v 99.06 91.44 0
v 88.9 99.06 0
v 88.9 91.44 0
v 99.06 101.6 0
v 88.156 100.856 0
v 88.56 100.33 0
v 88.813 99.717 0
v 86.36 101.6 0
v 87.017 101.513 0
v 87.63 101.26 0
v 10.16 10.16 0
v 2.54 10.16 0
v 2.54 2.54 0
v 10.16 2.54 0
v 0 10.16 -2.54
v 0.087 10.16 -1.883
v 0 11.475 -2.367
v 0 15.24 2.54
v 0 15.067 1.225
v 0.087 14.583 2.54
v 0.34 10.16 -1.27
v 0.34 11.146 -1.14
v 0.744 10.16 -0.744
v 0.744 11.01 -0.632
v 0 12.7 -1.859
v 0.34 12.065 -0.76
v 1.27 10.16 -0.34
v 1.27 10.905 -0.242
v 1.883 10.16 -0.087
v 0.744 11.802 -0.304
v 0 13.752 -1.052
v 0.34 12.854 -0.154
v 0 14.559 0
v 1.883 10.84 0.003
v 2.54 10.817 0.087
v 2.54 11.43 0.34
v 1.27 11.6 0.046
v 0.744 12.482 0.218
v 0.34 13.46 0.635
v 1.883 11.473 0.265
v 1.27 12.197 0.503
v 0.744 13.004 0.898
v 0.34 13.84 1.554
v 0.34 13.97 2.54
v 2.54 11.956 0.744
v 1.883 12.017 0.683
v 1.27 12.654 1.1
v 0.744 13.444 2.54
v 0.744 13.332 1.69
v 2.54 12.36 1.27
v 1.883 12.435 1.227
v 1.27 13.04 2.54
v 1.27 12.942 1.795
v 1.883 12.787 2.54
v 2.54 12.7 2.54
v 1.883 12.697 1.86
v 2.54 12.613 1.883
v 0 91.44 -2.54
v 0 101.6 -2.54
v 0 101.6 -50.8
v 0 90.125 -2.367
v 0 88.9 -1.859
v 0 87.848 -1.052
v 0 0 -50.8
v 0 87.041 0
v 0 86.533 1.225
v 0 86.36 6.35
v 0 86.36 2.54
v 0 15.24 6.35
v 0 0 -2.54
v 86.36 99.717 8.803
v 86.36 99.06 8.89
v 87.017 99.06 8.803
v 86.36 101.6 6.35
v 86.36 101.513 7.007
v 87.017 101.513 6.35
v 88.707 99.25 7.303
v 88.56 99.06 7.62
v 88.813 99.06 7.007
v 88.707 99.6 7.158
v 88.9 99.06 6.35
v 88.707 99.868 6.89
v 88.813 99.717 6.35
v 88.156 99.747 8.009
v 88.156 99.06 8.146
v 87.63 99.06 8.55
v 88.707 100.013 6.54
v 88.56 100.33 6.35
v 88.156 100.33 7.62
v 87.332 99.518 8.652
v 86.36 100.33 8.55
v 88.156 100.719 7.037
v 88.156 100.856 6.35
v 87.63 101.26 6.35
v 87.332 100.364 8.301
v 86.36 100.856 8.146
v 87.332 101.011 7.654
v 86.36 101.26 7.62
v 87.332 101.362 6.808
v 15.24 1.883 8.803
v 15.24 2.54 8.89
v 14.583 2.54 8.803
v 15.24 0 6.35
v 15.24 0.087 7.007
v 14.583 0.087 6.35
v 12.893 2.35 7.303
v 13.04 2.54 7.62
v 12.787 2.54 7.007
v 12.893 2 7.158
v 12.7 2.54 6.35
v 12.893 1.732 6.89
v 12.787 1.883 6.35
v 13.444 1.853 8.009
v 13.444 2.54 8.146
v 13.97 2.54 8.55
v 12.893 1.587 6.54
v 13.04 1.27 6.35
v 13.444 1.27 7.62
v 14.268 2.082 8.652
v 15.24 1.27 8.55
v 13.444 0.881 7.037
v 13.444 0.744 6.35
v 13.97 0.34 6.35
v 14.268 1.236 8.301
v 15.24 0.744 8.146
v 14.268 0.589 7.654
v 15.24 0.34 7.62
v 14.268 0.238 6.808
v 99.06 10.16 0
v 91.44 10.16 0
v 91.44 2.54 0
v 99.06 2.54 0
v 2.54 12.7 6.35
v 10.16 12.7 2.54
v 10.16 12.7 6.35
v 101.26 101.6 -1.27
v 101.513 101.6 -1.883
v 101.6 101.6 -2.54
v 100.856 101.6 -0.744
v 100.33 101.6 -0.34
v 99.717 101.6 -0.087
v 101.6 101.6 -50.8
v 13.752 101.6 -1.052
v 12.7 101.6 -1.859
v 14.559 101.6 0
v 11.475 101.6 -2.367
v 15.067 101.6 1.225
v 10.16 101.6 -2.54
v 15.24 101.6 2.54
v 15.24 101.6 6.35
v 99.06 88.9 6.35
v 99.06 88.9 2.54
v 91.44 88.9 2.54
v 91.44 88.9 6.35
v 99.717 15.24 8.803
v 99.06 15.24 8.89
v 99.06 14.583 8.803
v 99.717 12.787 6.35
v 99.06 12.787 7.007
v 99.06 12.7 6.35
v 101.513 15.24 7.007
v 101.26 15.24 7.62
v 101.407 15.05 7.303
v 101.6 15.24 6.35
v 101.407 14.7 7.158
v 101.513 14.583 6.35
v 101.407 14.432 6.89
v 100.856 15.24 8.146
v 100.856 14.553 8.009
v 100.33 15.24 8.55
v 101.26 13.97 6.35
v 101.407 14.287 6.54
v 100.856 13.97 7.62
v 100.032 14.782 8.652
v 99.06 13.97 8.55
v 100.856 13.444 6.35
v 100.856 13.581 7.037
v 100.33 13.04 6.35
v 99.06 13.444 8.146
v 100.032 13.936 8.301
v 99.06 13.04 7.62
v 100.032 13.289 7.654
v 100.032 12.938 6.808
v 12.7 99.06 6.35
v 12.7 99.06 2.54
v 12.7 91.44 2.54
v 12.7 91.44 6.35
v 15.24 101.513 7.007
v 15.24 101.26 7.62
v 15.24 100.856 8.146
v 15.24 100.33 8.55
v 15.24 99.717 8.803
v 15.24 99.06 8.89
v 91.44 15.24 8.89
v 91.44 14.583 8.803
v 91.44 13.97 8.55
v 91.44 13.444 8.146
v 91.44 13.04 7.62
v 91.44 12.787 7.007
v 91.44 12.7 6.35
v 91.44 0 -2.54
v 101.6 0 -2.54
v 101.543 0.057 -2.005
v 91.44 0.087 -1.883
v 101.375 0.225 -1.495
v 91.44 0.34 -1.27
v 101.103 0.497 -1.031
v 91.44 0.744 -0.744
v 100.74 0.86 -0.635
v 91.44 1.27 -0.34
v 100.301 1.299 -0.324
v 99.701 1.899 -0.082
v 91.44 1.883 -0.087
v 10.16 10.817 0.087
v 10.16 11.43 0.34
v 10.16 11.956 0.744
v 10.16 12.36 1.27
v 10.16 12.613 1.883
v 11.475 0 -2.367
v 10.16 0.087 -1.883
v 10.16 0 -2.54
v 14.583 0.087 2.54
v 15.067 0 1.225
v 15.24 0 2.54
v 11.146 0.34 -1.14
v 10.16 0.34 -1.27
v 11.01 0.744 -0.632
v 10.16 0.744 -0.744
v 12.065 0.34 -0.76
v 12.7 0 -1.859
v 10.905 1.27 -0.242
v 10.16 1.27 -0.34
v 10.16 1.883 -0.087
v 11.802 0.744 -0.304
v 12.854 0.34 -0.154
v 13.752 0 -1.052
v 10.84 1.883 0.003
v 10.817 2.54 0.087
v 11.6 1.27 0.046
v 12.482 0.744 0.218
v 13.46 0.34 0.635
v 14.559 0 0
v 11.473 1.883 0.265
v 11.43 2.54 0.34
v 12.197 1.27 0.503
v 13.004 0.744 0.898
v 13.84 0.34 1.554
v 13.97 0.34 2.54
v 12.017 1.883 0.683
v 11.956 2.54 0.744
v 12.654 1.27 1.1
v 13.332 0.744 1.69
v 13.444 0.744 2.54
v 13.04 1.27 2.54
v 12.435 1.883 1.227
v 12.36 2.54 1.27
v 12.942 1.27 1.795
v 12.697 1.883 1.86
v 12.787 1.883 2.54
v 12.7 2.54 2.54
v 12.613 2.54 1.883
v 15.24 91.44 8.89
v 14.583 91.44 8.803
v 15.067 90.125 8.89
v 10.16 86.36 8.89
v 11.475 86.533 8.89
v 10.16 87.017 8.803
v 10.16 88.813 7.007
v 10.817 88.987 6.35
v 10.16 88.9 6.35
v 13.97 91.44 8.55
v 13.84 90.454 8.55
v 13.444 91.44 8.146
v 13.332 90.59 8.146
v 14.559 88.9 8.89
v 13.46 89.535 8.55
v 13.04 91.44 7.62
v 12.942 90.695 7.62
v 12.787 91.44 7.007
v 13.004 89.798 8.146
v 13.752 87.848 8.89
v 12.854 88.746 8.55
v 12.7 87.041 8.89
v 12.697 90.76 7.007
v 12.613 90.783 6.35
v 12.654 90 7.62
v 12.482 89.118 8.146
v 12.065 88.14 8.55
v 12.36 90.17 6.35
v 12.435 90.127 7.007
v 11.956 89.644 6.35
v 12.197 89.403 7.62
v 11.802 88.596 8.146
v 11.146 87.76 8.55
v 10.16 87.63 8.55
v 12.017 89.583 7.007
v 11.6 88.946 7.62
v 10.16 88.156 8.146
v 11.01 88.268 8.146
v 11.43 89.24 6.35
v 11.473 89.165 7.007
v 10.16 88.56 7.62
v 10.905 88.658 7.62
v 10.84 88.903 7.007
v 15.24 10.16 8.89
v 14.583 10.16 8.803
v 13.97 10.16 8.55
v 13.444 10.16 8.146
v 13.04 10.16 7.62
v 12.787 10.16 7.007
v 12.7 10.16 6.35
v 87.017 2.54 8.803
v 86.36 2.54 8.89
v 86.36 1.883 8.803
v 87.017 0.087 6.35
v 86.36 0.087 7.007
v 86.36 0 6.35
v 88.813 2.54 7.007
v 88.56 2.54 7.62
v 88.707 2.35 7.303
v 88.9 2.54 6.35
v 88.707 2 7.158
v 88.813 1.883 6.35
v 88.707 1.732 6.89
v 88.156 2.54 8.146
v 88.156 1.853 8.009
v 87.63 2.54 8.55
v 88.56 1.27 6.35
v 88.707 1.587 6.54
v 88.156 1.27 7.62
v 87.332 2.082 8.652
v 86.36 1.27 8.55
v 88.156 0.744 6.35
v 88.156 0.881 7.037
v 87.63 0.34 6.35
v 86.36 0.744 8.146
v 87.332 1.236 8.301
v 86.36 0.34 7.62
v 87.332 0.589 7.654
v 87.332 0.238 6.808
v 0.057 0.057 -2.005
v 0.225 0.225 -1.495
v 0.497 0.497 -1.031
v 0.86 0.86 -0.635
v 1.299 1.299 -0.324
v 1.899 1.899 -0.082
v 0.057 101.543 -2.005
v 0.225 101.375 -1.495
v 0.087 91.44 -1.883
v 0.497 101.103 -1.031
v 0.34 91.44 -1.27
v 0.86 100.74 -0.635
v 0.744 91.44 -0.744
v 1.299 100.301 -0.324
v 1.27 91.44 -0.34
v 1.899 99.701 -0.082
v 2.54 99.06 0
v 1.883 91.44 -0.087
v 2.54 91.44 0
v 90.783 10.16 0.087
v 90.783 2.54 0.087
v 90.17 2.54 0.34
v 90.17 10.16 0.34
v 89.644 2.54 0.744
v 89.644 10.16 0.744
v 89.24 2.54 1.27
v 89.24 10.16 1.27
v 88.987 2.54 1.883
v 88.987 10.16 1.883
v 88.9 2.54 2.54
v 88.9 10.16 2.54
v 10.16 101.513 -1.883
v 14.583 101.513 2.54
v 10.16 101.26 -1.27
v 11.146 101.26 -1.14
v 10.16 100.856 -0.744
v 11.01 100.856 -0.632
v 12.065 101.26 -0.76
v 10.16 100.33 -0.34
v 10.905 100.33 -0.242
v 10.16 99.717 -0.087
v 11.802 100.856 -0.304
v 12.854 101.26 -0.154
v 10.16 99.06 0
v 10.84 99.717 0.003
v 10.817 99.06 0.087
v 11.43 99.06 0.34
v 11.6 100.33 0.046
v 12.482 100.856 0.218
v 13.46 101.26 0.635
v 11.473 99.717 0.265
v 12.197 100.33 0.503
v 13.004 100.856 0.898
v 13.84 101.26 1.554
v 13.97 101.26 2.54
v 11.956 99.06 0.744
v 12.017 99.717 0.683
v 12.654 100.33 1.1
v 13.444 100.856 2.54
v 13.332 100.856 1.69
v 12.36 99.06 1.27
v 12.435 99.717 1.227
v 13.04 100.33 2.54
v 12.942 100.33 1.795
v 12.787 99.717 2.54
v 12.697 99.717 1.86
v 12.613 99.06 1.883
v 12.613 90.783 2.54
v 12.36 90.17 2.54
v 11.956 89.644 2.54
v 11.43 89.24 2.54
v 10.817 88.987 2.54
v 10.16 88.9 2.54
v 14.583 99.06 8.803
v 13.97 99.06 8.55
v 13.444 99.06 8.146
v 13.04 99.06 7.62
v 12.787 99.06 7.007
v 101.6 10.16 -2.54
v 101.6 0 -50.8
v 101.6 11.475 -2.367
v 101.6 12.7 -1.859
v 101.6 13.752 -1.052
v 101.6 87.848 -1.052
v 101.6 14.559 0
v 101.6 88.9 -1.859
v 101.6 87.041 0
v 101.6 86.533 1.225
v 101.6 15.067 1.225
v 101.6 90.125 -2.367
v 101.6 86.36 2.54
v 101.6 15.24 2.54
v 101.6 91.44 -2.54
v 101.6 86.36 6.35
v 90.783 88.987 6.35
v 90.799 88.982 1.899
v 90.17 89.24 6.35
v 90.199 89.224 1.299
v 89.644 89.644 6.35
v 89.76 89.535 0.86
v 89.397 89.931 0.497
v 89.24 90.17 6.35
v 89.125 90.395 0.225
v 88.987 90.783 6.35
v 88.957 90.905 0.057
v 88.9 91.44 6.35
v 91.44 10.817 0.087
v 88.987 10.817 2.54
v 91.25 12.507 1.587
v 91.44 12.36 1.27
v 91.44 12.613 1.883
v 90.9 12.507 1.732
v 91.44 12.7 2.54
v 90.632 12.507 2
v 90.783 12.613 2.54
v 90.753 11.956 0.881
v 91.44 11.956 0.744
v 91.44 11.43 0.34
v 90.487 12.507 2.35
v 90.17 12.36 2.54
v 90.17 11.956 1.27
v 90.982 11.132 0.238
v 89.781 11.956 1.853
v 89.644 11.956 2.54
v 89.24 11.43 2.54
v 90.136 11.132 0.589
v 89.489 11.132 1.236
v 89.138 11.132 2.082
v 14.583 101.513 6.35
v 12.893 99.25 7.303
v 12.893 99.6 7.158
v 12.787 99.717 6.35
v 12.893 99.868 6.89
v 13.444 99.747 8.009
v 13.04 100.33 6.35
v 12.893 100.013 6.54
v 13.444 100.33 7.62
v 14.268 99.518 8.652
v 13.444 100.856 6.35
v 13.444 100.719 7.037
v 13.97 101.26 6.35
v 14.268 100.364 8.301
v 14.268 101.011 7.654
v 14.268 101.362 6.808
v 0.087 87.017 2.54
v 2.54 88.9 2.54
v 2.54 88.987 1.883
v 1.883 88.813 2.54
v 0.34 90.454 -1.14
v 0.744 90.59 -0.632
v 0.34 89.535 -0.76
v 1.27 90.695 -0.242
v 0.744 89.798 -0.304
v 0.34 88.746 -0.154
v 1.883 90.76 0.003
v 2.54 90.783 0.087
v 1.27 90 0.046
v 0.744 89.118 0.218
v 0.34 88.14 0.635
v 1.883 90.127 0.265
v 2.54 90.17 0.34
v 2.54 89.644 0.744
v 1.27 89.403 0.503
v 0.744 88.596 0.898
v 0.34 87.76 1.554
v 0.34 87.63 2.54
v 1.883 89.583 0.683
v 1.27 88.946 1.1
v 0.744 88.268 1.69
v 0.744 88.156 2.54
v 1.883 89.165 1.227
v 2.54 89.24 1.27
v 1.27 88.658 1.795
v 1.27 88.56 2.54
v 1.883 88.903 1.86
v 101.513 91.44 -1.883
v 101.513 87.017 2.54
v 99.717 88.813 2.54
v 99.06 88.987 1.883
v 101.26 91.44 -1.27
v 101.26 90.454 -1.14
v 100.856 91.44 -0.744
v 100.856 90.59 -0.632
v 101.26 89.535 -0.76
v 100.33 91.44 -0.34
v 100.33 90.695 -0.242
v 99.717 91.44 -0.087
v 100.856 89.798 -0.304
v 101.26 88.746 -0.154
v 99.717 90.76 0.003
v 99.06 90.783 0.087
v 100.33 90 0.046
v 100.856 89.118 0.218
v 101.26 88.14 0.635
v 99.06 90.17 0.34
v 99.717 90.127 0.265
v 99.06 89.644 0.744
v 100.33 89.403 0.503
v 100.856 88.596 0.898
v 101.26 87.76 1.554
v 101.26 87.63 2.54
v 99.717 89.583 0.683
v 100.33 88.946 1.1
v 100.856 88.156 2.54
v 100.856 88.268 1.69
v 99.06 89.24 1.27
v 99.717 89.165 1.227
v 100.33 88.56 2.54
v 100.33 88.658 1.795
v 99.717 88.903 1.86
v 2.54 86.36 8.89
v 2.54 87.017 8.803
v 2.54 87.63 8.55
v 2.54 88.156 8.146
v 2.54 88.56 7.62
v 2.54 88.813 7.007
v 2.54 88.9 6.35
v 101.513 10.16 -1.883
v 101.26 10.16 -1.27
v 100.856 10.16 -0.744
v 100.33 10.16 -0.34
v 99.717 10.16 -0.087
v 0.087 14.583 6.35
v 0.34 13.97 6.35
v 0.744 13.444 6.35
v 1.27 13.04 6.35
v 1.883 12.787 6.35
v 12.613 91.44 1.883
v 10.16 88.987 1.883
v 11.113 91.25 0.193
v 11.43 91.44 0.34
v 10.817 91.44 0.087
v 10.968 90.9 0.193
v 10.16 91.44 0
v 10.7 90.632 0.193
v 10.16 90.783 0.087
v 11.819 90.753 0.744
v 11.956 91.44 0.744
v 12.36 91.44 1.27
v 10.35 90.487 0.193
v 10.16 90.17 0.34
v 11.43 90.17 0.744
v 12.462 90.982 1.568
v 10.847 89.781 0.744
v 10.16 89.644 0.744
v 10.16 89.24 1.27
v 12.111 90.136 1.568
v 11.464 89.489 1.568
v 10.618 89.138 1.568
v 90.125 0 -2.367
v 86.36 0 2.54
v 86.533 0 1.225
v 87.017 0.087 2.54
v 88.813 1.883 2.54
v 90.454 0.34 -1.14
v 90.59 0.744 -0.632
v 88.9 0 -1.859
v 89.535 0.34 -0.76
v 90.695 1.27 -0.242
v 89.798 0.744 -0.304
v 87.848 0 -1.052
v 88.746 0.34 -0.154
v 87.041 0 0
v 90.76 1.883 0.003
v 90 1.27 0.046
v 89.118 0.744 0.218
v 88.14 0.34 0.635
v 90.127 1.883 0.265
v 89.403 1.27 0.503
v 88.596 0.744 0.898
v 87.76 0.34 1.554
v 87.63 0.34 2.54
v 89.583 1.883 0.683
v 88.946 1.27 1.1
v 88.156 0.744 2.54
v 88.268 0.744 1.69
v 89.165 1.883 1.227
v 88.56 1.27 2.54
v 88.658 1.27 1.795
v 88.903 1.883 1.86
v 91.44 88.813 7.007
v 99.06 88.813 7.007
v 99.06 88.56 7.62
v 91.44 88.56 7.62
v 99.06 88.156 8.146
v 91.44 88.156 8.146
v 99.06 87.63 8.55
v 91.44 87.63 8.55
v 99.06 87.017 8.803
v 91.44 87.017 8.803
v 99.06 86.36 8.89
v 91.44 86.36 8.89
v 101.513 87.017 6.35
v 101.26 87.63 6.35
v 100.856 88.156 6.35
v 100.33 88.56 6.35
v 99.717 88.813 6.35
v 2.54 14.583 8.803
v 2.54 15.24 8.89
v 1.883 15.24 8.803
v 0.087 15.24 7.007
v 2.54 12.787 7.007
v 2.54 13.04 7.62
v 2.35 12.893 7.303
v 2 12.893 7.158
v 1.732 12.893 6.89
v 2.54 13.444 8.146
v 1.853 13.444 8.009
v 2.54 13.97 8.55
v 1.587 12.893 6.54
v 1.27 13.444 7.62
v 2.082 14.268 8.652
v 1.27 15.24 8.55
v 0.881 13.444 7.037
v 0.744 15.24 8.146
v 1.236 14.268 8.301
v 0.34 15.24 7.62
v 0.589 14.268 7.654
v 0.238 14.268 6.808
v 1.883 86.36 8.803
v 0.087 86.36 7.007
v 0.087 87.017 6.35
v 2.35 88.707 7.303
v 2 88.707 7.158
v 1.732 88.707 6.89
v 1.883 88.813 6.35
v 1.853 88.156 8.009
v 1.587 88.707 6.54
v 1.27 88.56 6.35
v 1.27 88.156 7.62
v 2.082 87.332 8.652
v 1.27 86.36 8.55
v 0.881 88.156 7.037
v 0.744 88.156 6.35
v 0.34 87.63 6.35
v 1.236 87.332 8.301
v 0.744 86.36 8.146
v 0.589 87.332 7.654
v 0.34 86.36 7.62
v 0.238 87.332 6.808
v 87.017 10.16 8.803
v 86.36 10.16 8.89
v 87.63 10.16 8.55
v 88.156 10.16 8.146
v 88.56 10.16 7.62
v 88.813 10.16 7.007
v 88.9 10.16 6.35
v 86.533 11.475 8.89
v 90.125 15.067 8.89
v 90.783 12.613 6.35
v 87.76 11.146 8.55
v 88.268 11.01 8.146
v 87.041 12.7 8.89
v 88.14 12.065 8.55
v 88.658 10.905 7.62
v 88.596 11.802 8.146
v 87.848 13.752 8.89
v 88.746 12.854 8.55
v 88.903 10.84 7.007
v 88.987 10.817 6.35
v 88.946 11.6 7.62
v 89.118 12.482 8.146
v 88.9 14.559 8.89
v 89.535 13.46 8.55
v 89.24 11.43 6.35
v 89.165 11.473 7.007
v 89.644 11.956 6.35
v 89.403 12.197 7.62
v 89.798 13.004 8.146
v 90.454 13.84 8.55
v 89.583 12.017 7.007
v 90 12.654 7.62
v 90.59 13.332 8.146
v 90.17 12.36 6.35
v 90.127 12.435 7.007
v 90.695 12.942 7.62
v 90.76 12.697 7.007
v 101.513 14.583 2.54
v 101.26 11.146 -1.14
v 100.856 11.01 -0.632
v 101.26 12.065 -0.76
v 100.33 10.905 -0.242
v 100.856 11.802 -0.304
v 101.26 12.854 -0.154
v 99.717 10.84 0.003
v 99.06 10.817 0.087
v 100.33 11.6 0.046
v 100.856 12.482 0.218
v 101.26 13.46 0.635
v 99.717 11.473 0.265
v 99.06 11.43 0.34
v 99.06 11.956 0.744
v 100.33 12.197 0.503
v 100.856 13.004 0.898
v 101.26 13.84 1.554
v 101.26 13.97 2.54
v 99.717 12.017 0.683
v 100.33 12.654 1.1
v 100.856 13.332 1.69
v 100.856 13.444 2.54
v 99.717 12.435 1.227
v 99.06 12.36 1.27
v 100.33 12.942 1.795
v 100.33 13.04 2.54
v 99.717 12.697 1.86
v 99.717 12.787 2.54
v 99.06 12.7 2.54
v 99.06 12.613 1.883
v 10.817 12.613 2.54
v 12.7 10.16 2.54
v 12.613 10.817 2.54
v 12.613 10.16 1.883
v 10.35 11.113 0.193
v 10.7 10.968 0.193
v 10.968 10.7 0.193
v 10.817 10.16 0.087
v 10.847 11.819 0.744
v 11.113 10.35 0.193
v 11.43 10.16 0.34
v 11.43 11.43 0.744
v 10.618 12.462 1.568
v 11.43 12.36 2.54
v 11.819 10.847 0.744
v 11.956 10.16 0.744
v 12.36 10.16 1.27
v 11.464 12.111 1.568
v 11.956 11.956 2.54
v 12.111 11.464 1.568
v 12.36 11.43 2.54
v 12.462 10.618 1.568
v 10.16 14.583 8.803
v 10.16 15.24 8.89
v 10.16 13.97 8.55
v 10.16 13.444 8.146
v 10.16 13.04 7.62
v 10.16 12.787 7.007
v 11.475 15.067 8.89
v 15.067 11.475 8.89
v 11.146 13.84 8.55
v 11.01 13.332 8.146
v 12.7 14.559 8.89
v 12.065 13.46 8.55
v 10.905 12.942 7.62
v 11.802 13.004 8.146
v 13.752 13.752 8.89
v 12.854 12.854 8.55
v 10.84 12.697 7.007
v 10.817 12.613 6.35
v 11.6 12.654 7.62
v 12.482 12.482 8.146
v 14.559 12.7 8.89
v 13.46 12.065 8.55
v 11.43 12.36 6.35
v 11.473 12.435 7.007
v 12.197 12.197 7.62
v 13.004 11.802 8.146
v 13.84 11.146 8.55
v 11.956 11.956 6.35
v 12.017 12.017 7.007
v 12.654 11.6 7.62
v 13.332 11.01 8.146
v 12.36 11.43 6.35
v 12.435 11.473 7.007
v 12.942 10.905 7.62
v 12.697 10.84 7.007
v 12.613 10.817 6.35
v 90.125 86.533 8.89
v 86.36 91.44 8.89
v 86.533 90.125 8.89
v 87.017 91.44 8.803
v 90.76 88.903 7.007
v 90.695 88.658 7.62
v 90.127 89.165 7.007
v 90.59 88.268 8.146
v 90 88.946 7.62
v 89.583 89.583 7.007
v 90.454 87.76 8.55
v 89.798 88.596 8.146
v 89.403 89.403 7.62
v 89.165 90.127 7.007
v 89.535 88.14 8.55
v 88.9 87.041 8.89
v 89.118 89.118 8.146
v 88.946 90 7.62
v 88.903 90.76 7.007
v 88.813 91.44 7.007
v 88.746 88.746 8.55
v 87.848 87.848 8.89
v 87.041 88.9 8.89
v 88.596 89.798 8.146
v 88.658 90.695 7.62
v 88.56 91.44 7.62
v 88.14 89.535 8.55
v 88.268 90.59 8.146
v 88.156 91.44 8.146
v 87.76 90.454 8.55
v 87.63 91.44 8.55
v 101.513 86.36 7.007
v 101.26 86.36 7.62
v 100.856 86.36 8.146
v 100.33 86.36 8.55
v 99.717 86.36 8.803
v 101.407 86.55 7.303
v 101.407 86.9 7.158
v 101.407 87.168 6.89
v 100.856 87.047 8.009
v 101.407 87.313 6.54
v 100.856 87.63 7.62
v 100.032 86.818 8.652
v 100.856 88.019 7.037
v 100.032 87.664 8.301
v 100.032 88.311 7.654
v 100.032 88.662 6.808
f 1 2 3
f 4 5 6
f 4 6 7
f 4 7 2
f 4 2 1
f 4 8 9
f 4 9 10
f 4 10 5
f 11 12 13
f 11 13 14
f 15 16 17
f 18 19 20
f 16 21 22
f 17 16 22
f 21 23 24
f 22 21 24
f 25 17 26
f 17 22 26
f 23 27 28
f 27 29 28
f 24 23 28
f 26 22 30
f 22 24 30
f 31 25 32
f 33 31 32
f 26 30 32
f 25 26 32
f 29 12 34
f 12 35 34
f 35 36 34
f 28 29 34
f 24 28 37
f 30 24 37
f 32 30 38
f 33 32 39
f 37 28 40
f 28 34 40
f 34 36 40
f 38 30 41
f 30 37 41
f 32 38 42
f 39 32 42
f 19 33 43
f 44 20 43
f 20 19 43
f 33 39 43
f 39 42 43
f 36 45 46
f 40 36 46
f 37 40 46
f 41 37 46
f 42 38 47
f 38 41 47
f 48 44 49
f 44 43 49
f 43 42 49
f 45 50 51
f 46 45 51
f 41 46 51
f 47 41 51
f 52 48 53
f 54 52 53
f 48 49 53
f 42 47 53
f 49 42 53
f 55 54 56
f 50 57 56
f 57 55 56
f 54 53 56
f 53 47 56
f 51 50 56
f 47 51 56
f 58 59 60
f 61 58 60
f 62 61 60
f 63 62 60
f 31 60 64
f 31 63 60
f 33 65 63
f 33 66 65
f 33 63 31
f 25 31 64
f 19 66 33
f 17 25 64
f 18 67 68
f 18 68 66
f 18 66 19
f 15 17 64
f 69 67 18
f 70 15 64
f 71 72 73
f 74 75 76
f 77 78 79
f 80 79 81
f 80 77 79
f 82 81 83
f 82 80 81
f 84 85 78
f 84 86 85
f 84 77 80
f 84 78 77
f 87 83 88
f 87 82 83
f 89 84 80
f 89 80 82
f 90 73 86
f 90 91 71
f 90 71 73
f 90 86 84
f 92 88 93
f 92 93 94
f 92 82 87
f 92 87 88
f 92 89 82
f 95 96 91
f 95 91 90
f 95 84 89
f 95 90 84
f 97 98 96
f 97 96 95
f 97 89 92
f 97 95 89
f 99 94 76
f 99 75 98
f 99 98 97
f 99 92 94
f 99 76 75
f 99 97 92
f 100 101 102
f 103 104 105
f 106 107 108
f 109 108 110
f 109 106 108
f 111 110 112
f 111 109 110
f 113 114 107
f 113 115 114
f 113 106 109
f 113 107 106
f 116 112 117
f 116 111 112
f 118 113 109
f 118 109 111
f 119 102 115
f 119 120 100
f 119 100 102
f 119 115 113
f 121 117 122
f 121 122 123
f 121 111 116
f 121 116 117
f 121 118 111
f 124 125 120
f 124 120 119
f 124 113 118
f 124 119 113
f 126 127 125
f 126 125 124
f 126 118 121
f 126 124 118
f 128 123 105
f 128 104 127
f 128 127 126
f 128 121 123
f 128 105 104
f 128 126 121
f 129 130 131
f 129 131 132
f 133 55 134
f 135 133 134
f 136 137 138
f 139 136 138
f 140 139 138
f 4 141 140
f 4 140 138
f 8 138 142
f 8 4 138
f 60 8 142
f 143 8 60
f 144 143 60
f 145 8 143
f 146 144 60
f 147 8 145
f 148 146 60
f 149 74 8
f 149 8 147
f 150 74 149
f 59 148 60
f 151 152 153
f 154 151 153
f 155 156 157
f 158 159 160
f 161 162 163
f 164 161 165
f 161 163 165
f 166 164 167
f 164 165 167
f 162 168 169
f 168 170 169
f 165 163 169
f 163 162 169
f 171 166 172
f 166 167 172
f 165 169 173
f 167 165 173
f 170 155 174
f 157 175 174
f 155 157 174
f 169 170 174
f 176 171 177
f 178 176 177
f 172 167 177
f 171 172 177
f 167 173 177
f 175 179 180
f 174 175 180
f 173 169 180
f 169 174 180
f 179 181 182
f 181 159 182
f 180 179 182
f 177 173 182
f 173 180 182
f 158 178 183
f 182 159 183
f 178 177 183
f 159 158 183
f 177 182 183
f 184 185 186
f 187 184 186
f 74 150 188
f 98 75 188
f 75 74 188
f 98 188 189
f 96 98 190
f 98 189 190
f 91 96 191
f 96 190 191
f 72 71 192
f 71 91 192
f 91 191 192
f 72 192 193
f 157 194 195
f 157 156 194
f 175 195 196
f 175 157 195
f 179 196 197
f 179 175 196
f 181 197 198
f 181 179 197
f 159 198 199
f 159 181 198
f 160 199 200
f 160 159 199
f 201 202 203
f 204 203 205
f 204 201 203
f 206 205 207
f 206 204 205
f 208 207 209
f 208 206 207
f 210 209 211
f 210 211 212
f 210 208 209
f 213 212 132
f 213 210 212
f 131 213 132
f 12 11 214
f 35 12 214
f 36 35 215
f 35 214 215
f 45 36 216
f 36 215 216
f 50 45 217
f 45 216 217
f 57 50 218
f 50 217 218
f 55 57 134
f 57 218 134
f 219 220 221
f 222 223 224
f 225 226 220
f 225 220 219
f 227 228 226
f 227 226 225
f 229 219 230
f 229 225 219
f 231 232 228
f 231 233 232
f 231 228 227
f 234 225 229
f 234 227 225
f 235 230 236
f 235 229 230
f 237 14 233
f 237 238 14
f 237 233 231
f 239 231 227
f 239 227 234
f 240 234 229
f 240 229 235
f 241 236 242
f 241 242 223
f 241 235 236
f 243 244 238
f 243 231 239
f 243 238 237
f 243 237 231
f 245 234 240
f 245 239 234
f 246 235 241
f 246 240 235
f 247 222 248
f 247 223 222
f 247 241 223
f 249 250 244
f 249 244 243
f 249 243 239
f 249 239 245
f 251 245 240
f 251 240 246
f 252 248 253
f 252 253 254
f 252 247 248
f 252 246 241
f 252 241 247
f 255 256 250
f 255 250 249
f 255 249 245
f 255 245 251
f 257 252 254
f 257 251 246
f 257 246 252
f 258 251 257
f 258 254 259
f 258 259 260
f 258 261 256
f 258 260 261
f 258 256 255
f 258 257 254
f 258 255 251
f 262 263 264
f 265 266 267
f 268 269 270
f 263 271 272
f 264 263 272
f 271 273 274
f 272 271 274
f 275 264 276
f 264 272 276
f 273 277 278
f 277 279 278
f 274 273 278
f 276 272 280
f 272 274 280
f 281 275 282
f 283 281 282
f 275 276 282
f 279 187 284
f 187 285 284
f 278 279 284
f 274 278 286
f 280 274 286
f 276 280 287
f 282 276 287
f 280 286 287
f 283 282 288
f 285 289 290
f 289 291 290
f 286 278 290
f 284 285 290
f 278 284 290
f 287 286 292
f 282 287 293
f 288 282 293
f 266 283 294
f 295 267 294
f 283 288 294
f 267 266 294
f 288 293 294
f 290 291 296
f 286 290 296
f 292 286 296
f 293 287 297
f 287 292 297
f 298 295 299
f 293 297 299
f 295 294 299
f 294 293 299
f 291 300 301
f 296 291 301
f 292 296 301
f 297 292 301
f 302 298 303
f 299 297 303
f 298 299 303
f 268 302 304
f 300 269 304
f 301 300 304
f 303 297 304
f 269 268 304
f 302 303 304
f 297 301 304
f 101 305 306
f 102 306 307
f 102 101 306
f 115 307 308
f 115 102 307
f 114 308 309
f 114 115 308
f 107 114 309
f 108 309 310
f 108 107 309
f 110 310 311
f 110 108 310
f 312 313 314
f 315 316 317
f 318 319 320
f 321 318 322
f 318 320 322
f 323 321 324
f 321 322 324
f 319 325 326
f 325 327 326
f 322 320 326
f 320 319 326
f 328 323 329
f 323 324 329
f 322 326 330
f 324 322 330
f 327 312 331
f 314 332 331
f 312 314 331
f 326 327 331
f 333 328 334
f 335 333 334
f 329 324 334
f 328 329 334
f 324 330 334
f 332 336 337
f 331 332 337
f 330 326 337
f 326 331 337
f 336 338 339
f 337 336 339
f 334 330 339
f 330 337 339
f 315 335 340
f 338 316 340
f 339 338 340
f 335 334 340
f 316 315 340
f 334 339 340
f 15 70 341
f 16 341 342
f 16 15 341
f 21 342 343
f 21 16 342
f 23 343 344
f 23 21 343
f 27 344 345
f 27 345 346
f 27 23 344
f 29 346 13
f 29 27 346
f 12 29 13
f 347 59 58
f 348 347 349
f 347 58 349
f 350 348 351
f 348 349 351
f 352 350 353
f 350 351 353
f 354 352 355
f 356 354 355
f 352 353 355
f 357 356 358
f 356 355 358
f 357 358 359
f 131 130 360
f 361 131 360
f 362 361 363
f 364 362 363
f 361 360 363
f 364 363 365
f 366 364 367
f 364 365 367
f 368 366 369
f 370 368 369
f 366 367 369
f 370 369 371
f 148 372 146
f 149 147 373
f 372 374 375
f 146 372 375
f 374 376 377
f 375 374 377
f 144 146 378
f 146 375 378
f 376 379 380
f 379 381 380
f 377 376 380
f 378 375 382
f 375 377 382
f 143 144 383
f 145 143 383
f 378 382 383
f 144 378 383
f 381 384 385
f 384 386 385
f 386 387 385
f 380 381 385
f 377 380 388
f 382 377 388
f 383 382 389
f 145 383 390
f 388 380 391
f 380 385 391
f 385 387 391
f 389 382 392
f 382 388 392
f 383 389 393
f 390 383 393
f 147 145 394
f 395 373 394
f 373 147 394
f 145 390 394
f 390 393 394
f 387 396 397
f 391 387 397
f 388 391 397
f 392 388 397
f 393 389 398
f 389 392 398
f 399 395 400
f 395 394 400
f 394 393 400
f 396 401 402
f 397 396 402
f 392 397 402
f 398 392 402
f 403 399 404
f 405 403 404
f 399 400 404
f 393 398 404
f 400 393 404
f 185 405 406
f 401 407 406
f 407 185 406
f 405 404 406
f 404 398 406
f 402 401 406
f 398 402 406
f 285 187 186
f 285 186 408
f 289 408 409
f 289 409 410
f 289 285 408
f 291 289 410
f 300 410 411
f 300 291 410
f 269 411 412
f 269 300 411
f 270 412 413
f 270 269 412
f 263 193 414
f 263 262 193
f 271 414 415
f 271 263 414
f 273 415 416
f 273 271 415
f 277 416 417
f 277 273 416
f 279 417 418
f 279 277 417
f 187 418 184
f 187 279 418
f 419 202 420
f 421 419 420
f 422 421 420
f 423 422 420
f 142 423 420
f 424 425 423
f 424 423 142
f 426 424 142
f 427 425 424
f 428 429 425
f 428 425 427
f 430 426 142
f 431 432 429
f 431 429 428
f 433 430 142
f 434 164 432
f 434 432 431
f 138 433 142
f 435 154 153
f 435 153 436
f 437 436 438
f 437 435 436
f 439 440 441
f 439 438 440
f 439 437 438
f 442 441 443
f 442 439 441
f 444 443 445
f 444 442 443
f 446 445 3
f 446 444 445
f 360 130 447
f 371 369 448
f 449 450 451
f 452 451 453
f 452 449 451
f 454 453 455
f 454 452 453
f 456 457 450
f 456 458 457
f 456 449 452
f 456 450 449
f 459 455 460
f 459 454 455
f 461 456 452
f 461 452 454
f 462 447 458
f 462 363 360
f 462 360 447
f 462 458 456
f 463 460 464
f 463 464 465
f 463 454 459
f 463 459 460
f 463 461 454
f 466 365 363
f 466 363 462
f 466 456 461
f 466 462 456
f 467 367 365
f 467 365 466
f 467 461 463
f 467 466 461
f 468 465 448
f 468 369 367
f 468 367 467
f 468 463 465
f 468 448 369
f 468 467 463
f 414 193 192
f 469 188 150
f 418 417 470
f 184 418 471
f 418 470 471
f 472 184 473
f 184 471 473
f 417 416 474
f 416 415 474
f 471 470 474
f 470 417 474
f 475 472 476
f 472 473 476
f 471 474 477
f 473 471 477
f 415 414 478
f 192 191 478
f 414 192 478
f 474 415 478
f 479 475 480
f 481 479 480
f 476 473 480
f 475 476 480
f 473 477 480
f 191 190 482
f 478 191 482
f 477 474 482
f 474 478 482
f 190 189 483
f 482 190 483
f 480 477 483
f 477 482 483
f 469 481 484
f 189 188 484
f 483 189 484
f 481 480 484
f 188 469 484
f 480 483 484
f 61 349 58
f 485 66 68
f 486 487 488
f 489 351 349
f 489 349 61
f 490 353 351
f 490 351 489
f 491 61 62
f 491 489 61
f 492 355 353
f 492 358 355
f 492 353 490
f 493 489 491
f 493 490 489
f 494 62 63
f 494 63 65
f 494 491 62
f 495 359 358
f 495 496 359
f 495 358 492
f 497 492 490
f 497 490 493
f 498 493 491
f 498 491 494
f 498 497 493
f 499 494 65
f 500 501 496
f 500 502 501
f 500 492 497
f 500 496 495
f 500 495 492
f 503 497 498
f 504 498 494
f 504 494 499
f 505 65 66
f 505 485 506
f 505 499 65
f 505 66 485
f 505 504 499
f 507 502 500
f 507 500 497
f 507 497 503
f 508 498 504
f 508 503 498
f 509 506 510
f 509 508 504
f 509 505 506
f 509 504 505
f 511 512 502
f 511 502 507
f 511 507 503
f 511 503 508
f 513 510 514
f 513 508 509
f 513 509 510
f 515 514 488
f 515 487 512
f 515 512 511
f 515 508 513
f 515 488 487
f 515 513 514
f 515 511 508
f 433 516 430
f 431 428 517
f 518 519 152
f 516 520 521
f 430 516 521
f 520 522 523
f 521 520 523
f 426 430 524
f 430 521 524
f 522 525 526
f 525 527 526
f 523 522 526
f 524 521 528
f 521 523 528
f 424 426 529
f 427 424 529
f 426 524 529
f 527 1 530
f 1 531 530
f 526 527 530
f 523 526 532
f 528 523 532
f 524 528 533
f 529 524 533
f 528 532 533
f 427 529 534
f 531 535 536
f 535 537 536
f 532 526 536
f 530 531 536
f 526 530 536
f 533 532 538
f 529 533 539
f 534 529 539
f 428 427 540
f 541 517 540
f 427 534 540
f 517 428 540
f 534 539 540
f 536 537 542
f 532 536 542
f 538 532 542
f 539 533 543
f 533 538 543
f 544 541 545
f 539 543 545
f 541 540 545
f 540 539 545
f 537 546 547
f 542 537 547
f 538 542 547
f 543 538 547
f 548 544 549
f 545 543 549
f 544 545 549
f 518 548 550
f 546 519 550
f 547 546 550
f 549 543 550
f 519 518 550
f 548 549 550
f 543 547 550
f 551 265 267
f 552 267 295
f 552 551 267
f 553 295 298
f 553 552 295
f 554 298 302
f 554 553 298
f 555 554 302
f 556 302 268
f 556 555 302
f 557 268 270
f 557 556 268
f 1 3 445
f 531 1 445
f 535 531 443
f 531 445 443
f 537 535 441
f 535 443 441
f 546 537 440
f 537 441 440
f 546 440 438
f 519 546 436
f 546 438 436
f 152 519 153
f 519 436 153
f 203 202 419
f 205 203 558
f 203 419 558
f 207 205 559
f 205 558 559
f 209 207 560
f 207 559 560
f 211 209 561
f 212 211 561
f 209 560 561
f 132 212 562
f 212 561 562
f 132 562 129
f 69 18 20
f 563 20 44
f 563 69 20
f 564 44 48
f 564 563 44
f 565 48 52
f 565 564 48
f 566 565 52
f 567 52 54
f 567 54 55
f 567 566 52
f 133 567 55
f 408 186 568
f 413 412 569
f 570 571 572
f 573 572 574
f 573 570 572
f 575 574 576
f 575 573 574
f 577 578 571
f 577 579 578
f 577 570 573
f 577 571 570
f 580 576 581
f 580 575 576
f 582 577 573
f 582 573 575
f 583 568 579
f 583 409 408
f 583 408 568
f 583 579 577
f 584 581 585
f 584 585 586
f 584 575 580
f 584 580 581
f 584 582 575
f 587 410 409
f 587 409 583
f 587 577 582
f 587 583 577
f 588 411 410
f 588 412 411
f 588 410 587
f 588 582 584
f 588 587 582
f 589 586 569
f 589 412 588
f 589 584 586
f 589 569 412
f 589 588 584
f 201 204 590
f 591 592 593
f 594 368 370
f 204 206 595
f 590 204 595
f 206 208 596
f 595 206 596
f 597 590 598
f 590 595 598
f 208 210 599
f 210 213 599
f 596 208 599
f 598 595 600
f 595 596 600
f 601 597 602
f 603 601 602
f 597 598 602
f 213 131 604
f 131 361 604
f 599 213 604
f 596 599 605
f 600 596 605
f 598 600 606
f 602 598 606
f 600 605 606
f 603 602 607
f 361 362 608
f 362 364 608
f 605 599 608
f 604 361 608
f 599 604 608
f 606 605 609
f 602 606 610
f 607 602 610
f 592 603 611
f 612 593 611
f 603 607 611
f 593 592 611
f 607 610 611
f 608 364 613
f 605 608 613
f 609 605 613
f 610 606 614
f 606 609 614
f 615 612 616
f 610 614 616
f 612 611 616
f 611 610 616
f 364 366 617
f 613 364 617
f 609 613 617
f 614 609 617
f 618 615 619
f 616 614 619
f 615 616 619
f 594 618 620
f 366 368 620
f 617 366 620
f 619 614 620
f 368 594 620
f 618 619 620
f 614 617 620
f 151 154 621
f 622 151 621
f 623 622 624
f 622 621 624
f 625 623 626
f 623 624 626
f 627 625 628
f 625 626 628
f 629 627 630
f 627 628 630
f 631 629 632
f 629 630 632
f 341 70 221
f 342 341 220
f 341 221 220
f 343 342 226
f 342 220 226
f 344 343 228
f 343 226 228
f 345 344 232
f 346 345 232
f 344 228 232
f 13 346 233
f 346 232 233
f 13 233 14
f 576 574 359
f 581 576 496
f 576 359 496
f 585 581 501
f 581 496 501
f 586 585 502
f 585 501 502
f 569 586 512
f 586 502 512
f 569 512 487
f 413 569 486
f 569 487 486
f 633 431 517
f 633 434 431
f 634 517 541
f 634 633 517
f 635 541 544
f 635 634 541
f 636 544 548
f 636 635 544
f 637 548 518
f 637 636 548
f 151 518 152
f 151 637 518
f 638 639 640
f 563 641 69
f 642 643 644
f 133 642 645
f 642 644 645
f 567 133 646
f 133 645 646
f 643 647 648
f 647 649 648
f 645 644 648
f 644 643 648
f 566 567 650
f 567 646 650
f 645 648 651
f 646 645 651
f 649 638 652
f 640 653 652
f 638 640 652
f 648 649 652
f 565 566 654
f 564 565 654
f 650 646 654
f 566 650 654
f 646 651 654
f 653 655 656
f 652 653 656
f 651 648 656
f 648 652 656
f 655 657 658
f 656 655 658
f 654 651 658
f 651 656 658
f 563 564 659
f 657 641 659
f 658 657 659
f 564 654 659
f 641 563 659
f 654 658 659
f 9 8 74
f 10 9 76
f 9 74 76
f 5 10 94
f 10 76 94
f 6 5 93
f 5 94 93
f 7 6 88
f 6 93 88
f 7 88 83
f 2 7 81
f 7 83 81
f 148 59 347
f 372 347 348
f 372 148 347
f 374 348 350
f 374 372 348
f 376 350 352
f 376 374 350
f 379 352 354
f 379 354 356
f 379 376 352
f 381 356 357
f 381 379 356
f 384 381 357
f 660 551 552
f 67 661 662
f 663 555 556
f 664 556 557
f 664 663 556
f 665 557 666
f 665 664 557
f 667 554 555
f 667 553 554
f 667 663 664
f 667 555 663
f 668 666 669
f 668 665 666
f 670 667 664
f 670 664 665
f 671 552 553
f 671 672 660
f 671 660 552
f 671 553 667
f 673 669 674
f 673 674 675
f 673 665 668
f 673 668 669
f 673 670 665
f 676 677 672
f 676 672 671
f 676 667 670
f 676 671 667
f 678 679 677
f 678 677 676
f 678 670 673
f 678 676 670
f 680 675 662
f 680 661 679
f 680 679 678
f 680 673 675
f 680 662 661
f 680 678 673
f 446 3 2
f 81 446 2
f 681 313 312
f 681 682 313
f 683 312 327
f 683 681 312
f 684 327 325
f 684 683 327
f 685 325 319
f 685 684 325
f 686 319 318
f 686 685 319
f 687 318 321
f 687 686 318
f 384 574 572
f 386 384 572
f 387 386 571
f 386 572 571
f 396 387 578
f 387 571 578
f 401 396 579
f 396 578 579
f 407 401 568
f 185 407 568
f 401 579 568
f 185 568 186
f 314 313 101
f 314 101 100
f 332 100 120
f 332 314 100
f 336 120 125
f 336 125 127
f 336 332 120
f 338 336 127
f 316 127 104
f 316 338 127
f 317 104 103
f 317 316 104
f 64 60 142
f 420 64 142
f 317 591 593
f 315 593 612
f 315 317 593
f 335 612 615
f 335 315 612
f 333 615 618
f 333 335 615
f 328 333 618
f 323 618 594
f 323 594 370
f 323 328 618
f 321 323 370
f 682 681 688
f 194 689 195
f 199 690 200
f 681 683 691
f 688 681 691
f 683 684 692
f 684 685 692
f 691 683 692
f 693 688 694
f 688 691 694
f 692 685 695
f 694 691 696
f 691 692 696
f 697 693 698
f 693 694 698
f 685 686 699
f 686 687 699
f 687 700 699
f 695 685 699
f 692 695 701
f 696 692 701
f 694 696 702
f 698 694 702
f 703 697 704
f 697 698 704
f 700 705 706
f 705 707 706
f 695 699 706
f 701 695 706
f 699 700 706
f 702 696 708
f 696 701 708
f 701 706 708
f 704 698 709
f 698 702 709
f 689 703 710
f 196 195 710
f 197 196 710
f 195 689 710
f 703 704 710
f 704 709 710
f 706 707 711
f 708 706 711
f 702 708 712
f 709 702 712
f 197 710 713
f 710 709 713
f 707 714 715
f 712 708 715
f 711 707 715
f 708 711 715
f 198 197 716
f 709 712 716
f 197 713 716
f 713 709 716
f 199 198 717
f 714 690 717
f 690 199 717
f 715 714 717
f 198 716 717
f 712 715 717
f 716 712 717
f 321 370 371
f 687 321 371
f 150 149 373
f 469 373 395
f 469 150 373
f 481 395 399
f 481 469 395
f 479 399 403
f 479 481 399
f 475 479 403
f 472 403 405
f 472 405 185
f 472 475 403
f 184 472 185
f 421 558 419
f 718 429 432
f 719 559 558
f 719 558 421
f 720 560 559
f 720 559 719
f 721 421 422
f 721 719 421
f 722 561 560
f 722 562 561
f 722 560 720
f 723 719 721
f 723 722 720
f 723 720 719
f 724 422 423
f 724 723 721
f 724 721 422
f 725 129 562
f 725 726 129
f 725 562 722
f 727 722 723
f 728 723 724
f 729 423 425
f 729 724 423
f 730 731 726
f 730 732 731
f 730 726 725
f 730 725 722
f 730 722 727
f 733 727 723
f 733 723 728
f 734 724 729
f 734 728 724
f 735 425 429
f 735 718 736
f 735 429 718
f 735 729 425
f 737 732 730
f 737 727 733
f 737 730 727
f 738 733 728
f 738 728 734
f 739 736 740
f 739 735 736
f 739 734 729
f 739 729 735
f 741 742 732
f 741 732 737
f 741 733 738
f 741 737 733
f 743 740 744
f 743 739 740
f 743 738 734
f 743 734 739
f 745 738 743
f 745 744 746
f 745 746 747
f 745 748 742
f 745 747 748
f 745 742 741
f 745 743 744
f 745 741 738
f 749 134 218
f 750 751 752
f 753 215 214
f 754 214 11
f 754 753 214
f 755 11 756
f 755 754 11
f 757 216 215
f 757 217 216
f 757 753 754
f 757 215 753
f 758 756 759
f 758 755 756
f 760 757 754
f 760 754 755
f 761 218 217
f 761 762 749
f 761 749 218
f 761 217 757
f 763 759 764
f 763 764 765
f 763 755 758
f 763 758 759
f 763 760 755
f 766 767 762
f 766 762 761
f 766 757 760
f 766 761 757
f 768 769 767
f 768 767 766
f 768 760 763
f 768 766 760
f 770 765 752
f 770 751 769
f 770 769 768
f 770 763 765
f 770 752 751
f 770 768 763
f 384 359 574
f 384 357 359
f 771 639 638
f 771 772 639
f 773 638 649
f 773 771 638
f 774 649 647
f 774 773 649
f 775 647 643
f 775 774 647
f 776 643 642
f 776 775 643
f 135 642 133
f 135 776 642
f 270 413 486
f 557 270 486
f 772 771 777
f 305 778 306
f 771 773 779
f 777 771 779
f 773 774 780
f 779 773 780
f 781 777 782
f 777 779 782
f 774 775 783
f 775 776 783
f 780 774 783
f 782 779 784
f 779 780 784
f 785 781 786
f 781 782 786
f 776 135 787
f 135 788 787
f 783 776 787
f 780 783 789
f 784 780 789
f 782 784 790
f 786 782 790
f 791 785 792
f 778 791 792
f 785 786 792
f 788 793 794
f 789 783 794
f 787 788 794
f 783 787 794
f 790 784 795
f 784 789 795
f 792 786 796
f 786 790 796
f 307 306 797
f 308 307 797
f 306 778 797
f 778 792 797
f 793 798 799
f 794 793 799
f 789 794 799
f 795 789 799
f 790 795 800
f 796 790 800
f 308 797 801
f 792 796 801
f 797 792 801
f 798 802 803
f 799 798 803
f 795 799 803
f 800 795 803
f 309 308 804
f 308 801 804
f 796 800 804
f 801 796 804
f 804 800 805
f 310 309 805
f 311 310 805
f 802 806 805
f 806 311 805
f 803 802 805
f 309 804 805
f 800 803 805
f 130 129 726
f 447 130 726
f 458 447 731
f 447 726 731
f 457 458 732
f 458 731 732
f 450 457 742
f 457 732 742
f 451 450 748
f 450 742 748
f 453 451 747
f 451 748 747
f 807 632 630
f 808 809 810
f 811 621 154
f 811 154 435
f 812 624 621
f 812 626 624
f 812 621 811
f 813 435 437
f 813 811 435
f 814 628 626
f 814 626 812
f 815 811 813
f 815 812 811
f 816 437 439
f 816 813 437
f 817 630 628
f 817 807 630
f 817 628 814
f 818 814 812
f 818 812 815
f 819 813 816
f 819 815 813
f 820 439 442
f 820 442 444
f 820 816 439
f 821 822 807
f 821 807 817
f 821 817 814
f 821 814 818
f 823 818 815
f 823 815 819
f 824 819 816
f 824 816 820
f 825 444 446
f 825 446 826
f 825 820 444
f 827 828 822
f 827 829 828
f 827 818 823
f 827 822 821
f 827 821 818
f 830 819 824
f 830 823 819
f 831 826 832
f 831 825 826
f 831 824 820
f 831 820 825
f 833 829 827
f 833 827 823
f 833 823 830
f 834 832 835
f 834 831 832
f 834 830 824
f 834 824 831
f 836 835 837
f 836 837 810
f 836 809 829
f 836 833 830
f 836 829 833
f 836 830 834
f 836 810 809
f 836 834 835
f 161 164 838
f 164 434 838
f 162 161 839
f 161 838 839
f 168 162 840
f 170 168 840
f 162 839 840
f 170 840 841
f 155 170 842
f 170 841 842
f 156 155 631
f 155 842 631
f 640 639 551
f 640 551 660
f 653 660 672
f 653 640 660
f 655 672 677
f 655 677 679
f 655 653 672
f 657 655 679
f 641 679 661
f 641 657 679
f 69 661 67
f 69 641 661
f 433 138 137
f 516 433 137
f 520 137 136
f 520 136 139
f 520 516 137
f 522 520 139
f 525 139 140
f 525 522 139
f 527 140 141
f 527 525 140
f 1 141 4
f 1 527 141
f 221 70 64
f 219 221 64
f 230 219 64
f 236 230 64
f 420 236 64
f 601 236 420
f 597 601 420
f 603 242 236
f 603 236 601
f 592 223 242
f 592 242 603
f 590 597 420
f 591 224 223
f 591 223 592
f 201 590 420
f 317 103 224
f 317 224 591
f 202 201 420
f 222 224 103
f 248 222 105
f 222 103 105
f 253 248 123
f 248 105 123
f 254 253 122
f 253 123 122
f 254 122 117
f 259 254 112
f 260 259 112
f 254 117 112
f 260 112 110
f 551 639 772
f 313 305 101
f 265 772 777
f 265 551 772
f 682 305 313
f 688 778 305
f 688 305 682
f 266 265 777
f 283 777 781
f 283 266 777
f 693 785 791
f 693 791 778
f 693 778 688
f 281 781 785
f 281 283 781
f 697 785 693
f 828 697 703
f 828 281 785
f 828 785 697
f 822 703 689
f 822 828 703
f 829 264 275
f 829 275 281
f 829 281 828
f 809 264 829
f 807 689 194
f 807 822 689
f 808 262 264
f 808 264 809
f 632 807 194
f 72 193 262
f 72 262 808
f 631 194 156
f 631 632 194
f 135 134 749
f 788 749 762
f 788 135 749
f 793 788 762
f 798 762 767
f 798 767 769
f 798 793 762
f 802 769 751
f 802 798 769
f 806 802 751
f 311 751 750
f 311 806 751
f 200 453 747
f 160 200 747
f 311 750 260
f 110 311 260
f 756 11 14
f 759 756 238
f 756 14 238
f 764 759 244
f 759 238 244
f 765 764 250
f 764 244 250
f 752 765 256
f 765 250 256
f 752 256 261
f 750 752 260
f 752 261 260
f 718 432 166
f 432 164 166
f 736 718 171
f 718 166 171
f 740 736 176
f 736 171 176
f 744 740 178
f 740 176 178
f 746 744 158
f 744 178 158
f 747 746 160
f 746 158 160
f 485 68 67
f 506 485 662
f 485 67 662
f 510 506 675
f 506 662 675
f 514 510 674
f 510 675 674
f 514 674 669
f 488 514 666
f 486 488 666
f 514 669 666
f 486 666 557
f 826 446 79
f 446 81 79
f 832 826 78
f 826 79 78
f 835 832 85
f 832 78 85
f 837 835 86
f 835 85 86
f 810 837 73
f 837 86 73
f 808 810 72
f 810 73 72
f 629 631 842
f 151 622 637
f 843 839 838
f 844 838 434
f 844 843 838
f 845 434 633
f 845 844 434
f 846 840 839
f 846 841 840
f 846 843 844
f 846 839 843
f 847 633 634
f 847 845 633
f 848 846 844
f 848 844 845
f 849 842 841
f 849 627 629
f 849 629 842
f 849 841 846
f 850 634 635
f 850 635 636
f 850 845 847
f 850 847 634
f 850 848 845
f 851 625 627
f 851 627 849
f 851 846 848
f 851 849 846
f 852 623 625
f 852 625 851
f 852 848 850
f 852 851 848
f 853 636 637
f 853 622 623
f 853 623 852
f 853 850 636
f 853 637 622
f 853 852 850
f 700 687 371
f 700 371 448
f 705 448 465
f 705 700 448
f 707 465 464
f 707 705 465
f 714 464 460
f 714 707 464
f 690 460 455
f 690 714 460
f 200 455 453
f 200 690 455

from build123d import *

# Parameters (mm, degrees)
F0_W     = 12.7
F0_H     = 12.7
F1_DEPTH = 50.8
F2_DEPTH = 8.89
F3_F1_R  = 2.54
F3_F2_R  = 2.54


with BuildPart() as f1:
    # F0 (on Top) → F1 (new body)
    with BuildSketch(Plane.XY):
        Polygon((12.7, 12.7), (12.7, 0), (88.9, 0), (88.9, 12.7), (101.6, 12.7), (101.6, 88.9), (88.9, 88.9), (88.9, 101.6), (12.7, 101.6), (12.7, 88.9), (0, 88.9), (0, 12.7), align=None)
        with Locations((6.35, 95.25)):
            Rectangle(F0_W, F0_H)
        with Locations((95.25, 95.25)):
            Rectangle(F0_W, F0_H)
        with Locations((95.25, 6.35)):
            Rectangle(F0_W, F0_H)
        with Locations((6.35, 6.35)):
            Rectangle(F0_W, F0_H)
    extrude(amount=-F1_DEPTH)

    # F0 (on Top) → F2 (join)
    with BuildSketch(Plane.XY):
        Polygon((12.7, 12.7), (12.7, 0), (88.9, 0), (88.9, 12.7), (101.6, 12.7), (101.6, 88.9), (88.9, 88.9), (88.9, 101.6), (12.7, 101.6), (12.7, 88.9), (0, 88.9), (0, 12.7), align=None)
    extrude(amount=F2_DEPTH)

    # F3: fillet of radius 2.54 on 31 edges, made by hand

    # F3_f1
    f3_f1_edges = [f1.edges().sort_by_distance(p)[0] for p in [
        (88.9, 6.35, 0),
        (95.25, 12.7, 0),
        (88.9, 12.7, 4.445),
        (12.7, 12.7, 4.445),
        (6.35, 12.7, 0),
        (12.7, 6.35, 0),
        (12.7, 88.9, 4.445),
        (12.7, 95.25, 0),
        (6.35, 88.9, 0),
        (95.25, 88.9, 0),
        (88.9, 88.9, 4.445),
    ]]
    fillet(f3_f1_edges, radius=F3_F1_R)

    # F3_f2
    f3_f2_edges = [f1.edges().sort_by_distance(p)[0] for p in [
        (50.8, 101.6, 8.89),
        (0, 50.8, 8.89),
        (50.8, 0, 8.89),
        (96.52, 88.9, 8.89),
        (5.08, 88.9, 8.89),
        (5.08, 12.7, 8.89),
        (96.52, 12.7, 8.89),
        (101.6, 50.8, 8.89),
        (88.9, 5.08, 8.89),
        (12.7, 5.08, 8.89),
        (12.7, 96.52, 8.89),
        (88.9, 96.52, 8.89),
        (88.9, 101.6, 4.445),
        (101.6, 12.7, 5.715),
        (88.9, 0, 5.715),
        (12.7, 0, 5.715),
        (0, 12.7, 5.715),
        (0, 88.9, 5.715),
        (12.7, 101.6, 5.715),
        (101.6, 88.9, 5.715),
        (101.6, 89.6439487758, 0.7439487758),
        (11.9560512242, 101.6, 0.7439487758),
        (0, 89.6439487758, 0.7439487758),
        (0, 11.9560512242, 0.7439487758),
        (11.9560512242, 0, 0.7439487758),
        (89.6439487758, 0, 0.7439487758),
        (101.6, 11.9560512242, 0.7439487758),
        (89.6439487758, 89.6439487758, 8.89),
        (11.9560512242, 89.6439487758, 8.89),
        (11.9560512242, 11.9560512242, 8.89),
        (89.6439487758, 11.9560512242, 8.89),
    ]]
    fillet(f3_f2_edges, radius=F3_F2_R)


solid = f1.part
